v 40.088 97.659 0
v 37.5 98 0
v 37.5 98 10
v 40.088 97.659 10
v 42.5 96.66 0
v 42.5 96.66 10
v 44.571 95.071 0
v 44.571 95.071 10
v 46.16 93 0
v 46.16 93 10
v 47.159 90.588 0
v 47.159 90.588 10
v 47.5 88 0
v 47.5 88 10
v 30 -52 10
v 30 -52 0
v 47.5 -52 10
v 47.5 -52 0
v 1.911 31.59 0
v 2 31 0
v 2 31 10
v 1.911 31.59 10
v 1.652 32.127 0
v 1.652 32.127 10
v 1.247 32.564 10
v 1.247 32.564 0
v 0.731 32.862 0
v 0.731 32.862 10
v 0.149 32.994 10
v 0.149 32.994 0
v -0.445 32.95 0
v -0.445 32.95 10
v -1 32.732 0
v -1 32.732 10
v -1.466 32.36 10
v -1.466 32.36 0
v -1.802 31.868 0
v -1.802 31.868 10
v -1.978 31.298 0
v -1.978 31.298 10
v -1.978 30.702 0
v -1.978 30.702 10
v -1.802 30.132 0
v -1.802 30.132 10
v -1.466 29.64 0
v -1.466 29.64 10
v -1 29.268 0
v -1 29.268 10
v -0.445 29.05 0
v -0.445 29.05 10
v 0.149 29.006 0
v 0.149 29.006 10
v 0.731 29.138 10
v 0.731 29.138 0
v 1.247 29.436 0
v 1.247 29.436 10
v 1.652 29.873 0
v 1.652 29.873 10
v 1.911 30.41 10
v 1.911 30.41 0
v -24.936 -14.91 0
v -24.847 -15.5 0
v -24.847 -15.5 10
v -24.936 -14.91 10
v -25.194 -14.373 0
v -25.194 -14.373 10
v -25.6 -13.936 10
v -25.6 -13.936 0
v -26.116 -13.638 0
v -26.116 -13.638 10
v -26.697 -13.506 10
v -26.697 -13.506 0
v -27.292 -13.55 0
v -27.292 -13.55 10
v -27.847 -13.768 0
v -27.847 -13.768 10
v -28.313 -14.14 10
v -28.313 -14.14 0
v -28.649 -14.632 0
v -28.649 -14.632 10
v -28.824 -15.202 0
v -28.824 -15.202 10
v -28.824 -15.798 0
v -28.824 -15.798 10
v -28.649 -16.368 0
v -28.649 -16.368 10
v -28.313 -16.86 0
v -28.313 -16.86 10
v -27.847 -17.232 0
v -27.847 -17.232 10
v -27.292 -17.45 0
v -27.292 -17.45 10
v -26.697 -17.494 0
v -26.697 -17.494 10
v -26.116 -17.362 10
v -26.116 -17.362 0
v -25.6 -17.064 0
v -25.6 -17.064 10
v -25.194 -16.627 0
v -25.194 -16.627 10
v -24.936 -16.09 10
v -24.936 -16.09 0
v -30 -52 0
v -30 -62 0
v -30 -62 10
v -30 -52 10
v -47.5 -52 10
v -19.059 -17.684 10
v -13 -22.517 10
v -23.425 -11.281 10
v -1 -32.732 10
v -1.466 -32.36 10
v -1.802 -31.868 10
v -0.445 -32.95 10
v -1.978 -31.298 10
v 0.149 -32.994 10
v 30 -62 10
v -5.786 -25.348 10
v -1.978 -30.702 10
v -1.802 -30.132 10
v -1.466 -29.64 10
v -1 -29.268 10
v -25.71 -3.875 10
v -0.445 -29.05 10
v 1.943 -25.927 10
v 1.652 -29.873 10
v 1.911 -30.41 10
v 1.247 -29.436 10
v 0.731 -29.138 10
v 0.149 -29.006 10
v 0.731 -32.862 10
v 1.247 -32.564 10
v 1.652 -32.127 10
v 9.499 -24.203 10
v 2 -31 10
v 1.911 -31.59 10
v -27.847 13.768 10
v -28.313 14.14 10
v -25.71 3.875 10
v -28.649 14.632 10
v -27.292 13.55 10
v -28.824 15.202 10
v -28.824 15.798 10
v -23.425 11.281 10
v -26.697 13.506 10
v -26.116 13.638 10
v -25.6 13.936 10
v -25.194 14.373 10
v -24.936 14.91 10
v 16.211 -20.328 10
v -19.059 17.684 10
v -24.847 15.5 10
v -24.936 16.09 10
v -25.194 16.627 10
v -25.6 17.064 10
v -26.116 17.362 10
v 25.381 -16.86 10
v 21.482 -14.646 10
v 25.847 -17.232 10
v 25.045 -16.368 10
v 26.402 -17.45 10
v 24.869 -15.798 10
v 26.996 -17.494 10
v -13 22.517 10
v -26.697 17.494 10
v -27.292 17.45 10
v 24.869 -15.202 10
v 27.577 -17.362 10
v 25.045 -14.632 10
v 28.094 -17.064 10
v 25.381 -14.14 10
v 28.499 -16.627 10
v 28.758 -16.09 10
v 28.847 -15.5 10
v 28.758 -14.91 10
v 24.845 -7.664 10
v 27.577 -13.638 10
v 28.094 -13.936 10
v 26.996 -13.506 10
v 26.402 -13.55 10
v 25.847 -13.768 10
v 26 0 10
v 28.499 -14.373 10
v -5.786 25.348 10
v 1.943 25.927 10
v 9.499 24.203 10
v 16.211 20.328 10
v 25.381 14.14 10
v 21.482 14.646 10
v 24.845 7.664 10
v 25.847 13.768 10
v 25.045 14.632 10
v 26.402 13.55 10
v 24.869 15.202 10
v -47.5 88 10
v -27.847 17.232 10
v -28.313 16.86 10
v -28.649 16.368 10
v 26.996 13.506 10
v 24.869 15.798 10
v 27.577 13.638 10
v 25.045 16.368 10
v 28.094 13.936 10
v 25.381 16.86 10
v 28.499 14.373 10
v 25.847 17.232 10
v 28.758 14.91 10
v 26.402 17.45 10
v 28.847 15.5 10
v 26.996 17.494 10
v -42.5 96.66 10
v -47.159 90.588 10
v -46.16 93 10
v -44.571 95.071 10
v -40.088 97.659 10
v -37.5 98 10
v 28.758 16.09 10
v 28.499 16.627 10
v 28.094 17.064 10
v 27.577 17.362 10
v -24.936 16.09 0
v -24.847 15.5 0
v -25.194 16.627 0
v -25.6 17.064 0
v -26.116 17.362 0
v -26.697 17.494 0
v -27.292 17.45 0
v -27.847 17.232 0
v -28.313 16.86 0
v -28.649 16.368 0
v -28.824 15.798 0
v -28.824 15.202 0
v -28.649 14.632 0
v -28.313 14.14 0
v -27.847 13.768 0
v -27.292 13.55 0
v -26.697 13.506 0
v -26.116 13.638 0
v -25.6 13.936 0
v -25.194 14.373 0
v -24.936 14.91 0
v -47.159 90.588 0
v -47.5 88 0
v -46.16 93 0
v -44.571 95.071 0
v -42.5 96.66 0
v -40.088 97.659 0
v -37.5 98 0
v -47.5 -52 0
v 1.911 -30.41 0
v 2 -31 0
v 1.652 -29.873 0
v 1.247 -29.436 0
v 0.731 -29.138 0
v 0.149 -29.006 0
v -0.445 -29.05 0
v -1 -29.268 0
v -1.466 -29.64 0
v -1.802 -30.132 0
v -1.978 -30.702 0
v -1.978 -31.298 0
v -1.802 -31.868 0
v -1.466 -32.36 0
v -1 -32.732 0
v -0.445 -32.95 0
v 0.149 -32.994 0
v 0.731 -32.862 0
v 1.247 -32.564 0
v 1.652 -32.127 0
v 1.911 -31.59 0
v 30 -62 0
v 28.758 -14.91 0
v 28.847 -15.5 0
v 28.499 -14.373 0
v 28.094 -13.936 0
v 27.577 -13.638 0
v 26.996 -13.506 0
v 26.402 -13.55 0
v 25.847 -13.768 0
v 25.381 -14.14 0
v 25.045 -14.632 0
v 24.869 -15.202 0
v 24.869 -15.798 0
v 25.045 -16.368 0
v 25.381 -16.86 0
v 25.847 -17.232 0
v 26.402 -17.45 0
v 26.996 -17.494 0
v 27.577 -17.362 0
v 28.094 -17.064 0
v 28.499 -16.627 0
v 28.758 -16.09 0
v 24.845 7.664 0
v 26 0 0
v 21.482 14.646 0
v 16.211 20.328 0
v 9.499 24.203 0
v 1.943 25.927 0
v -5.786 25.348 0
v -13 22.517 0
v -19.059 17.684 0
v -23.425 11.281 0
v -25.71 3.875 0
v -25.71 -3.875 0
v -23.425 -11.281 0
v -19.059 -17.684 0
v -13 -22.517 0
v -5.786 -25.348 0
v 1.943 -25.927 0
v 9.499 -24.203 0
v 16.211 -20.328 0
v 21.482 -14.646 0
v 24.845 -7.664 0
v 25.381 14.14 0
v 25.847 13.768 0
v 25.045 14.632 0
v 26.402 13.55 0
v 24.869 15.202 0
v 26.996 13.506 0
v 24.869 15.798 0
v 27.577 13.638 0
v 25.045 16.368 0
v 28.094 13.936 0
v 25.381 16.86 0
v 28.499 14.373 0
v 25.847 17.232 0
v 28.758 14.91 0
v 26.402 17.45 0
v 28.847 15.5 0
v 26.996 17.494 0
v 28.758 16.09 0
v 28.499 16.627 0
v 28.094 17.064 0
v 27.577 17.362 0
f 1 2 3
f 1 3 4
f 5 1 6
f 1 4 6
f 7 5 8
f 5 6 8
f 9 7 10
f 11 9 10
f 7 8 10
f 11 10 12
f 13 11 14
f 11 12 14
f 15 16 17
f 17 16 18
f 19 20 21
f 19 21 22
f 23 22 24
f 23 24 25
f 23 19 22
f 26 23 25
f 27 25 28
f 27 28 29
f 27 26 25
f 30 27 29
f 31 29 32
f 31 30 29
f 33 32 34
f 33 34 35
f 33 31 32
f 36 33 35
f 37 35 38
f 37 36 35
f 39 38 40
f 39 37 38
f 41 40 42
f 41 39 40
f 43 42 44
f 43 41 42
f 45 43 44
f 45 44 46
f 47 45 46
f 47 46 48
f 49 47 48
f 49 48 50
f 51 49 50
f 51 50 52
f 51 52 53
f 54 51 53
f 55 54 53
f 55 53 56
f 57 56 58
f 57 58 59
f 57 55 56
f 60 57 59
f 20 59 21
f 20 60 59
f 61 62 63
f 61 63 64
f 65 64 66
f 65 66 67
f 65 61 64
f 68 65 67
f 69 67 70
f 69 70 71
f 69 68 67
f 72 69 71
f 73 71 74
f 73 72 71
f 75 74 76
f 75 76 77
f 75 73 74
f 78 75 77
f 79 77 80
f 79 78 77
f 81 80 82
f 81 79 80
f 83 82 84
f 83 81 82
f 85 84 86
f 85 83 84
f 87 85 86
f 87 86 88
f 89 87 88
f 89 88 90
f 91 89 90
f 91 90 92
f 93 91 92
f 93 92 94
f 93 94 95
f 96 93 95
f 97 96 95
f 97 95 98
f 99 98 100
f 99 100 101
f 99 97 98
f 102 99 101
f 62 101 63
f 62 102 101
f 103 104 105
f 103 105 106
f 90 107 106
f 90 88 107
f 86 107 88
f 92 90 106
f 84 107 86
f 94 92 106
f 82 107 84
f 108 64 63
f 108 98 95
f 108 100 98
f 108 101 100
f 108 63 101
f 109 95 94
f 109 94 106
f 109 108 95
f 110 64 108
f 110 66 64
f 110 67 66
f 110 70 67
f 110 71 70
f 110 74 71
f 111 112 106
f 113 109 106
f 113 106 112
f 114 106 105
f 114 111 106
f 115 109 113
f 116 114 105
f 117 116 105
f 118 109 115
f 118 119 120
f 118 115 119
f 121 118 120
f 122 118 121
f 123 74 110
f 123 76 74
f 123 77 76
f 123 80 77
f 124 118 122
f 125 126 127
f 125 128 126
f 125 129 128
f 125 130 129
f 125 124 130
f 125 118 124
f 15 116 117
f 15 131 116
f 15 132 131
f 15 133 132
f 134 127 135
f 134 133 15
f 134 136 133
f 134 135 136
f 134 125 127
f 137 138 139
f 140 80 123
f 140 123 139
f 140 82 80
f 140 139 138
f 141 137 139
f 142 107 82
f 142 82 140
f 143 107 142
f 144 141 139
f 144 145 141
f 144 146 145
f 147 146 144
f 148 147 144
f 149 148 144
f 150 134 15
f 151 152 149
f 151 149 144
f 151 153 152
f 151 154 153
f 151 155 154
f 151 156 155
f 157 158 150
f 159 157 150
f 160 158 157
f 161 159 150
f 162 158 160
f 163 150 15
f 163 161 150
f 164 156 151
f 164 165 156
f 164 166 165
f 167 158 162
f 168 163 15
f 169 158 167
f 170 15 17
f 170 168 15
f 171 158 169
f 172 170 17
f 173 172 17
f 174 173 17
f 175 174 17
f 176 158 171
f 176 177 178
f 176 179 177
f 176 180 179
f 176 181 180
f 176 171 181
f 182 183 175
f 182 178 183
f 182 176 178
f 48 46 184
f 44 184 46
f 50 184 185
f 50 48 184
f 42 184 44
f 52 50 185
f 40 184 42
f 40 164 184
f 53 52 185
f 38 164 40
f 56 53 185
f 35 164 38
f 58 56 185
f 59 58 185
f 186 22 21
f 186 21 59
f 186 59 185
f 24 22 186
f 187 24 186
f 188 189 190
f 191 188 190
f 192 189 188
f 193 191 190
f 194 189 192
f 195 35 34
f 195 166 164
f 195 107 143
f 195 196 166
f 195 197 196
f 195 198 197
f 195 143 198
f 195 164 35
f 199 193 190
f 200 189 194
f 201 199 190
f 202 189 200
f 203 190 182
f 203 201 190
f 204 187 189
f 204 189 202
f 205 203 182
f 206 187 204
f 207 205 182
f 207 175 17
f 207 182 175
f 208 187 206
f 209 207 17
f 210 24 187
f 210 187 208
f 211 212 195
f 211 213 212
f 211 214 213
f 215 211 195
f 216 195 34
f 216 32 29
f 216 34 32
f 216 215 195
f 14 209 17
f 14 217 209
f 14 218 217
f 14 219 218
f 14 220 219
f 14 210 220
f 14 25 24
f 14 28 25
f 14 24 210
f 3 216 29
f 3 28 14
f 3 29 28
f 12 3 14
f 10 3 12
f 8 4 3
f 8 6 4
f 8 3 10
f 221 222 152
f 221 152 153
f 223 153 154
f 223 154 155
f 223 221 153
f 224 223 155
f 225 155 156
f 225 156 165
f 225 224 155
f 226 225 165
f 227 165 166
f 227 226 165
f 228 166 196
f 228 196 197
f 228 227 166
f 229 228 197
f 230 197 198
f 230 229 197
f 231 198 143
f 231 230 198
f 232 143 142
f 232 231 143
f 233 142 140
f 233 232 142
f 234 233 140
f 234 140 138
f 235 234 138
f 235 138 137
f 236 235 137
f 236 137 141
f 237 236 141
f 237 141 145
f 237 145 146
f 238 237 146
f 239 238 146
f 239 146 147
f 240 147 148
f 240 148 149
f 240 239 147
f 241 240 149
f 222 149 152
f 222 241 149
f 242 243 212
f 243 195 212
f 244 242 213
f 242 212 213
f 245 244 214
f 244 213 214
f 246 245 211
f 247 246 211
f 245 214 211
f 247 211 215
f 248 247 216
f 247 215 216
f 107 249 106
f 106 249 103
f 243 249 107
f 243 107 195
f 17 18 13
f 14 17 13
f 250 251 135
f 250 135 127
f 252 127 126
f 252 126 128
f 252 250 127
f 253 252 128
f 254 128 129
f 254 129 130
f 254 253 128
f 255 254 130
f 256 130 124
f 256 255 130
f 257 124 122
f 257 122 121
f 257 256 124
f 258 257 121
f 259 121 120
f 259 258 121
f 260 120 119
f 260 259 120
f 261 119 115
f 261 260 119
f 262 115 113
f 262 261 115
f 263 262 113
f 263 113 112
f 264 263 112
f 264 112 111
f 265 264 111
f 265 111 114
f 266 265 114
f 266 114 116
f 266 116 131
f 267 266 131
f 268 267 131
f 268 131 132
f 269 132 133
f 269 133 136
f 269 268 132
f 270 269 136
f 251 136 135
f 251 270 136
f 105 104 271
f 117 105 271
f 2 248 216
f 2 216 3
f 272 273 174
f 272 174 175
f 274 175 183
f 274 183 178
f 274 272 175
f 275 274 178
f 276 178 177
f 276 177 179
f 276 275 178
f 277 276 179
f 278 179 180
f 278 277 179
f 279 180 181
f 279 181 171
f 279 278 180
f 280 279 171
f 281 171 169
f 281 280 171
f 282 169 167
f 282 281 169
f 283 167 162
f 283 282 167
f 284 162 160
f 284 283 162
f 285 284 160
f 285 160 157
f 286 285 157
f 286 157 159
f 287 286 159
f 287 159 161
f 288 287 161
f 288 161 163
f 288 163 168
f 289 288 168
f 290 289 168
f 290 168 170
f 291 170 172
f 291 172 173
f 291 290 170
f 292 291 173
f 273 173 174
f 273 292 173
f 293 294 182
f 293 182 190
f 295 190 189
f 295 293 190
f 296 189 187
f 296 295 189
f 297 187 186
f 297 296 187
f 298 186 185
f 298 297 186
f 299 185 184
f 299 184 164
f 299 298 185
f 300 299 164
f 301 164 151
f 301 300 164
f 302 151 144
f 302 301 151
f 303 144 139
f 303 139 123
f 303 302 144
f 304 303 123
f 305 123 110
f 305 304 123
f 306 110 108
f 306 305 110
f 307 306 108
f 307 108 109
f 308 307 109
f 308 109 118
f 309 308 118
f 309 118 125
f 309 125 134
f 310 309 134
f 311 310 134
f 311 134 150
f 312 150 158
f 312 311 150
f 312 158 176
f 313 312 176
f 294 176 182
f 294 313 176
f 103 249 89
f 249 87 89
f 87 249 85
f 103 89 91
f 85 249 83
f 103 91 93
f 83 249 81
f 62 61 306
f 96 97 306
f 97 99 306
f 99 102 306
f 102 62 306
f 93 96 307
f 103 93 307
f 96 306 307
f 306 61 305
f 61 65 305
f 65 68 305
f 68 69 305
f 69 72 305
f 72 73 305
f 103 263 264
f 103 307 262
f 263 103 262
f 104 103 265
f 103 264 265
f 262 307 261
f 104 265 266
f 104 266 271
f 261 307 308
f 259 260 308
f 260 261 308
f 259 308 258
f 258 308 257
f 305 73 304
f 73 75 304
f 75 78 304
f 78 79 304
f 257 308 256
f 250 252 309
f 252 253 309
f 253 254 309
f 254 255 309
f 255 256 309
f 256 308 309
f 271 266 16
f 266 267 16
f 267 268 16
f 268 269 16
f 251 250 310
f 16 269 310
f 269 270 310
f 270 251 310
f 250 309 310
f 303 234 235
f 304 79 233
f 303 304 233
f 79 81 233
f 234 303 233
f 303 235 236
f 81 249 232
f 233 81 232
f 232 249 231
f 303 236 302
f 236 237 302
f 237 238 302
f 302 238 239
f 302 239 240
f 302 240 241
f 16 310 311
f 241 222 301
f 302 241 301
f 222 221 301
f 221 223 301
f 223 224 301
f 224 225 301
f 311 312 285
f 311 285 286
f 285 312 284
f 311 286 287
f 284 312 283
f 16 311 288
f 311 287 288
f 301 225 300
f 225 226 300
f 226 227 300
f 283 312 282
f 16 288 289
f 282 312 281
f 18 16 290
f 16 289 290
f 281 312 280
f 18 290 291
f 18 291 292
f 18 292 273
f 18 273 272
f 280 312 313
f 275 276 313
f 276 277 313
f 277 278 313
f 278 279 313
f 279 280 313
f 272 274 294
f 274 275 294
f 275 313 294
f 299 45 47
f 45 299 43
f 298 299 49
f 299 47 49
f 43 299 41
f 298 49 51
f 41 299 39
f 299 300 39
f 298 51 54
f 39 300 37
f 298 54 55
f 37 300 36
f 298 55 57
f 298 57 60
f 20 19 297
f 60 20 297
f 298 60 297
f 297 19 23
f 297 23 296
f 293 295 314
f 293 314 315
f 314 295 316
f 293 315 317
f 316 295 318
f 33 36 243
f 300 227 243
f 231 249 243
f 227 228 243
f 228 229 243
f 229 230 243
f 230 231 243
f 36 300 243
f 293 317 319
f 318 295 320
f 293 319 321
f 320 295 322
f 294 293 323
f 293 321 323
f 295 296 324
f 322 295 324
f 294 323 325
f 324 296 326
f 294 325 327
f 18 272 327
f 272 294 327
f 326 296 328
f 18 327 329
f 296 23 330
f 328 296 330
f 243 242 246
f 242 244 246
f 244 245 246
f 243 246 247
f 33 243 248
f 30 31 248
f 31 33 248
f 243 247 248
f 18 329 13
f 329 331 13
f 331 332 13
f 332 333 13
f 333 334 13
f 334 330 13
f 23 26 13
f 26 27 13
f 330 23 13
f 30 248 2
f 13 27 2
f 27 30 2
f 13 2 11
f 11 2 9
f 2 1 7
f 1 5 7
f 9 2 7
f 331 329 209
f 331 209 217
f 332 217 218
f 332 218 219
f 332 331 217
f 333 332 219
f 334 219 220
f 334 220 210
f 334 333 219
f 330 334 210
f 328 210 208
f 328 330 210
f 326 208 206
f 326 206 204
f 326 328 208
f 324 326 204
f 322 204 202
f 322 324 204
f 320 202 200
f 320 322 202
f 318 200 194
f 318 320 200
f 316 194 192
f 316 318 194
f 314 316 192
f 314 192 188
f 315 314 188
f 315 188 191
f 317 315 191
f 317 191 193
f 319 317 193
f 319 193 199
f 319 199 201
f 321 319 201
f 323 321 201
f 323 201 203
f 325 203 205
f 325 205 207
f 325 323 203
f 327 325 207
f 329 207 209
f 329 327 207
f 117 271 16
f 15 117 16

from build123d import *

# Parameters (mm, degrees)
SKETCH1_W           = 95
SKETCH1_H           = 150
SKETCH1_R           = 2
SKETCH1_R_2         = 26
SKETCH1_W_2         = 60
SKETCH1_H_2         = 10
BOSS_EXTRUDE1_DEPTH = 10
FILLET1_R           = 10


with BuildPart() as part:
    # Sketch1 → Boss-Extrude1 (new body)
    # profile 1 of 2: a face of its own
    with BuildSketch(Plane.XY):
        with Locations((0, 23)):
            Rectangle(SKETCH1_W, SKETCH1_H)
        with Locations((-26.846787517, 15.5)):
            Circle(SKETCH1_R, mode=Mode.SUBTRACT)
        with Locations((-26.846787517, -15.5)):
            Circle(SKETCH1_R, mode=Mode.SUBTRACT)
        with Locations((0, -31)):
            Circle(SKETCH1_R, mode=Mode.SUBTRACT)
        with Locations((26.846787517, -15.5)):
            Circle(SKETCH1_R, mode=Mode.SUBTRACT)
        with Locations((26.846787517, 15.5)):
            Circle(SKETCH1_R, mode=Mode.SUBTRACT)
        with Locations((0, 31)):
            Circle(SKETCH1_R, mode=Mode.SUBTRACT)
        Circle(SKETCH1_R_2, mode=Mode.SUBTRACT)
    # profile 2 of 2: a face of its own
    with BuildSketch(Plane.XY):
        with Locations((0, -57)):
            Rectangle(SKETCH1_W_2, SKETCH1_H_2)
    extrude(amount=BOSS_EXTRUDE1_DEPTH)

    # Fillet1
    fillet1_edges = [part.edges().sort_by_distance(p)[0] for p in [
        (-47.5, 98, 5),
        (47.5, 98, 5),
    ]]
    fillet(fillet1_edges, radius=FILLET1_R)


solid = part.part
